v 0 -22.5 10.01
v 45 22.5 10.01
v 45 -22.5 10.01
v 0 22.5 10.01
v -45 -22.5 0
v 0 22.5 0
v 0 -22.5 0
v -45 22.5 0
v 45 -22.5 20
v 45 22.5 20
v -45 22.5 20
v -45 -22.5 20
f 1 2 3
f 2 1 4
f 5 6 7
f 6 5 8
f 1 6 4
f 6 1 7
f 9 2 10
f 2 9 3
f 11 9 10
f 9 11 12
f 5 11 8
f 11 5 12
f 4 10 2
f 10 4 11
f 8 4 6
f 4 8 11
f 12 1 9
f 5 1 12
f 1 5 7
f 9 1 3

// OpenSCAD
// Drying rack for microscope slides - a solid base block with a row of parallel slots cut near
// the top, open at the top so wet slides standing on their long edge drain by capillary action.
// NOVEL general part (a generic "slide dryer" could apply to many labs).
//

slides_l = 75;
slides_w = 25;
slides_t = 1;
base_l   = 90;
base_w   = 45;
base_h   = 20;
slot_l   = 77;
slot_w   = 1.6;
slot_d   = 10;
pitch    = 3.5;

$fn = 48;

// The slot is open at the top: we only remove material down to (base_h - slot_d + 0.01),
// leaving the top face intact except for the openings.

difference() {
    translate([-base_l / 2, -base_w / 2, 0]) cube([base_l, base_w, base_h]);
    for (y = [-base_w / 2 - pitch / 2 : pitch : base_w / 2 + pitch / 2])
        translate([0, y, 0])
            cube([slot_l, base_w, base_h - slot_d + 0.01]);
}
